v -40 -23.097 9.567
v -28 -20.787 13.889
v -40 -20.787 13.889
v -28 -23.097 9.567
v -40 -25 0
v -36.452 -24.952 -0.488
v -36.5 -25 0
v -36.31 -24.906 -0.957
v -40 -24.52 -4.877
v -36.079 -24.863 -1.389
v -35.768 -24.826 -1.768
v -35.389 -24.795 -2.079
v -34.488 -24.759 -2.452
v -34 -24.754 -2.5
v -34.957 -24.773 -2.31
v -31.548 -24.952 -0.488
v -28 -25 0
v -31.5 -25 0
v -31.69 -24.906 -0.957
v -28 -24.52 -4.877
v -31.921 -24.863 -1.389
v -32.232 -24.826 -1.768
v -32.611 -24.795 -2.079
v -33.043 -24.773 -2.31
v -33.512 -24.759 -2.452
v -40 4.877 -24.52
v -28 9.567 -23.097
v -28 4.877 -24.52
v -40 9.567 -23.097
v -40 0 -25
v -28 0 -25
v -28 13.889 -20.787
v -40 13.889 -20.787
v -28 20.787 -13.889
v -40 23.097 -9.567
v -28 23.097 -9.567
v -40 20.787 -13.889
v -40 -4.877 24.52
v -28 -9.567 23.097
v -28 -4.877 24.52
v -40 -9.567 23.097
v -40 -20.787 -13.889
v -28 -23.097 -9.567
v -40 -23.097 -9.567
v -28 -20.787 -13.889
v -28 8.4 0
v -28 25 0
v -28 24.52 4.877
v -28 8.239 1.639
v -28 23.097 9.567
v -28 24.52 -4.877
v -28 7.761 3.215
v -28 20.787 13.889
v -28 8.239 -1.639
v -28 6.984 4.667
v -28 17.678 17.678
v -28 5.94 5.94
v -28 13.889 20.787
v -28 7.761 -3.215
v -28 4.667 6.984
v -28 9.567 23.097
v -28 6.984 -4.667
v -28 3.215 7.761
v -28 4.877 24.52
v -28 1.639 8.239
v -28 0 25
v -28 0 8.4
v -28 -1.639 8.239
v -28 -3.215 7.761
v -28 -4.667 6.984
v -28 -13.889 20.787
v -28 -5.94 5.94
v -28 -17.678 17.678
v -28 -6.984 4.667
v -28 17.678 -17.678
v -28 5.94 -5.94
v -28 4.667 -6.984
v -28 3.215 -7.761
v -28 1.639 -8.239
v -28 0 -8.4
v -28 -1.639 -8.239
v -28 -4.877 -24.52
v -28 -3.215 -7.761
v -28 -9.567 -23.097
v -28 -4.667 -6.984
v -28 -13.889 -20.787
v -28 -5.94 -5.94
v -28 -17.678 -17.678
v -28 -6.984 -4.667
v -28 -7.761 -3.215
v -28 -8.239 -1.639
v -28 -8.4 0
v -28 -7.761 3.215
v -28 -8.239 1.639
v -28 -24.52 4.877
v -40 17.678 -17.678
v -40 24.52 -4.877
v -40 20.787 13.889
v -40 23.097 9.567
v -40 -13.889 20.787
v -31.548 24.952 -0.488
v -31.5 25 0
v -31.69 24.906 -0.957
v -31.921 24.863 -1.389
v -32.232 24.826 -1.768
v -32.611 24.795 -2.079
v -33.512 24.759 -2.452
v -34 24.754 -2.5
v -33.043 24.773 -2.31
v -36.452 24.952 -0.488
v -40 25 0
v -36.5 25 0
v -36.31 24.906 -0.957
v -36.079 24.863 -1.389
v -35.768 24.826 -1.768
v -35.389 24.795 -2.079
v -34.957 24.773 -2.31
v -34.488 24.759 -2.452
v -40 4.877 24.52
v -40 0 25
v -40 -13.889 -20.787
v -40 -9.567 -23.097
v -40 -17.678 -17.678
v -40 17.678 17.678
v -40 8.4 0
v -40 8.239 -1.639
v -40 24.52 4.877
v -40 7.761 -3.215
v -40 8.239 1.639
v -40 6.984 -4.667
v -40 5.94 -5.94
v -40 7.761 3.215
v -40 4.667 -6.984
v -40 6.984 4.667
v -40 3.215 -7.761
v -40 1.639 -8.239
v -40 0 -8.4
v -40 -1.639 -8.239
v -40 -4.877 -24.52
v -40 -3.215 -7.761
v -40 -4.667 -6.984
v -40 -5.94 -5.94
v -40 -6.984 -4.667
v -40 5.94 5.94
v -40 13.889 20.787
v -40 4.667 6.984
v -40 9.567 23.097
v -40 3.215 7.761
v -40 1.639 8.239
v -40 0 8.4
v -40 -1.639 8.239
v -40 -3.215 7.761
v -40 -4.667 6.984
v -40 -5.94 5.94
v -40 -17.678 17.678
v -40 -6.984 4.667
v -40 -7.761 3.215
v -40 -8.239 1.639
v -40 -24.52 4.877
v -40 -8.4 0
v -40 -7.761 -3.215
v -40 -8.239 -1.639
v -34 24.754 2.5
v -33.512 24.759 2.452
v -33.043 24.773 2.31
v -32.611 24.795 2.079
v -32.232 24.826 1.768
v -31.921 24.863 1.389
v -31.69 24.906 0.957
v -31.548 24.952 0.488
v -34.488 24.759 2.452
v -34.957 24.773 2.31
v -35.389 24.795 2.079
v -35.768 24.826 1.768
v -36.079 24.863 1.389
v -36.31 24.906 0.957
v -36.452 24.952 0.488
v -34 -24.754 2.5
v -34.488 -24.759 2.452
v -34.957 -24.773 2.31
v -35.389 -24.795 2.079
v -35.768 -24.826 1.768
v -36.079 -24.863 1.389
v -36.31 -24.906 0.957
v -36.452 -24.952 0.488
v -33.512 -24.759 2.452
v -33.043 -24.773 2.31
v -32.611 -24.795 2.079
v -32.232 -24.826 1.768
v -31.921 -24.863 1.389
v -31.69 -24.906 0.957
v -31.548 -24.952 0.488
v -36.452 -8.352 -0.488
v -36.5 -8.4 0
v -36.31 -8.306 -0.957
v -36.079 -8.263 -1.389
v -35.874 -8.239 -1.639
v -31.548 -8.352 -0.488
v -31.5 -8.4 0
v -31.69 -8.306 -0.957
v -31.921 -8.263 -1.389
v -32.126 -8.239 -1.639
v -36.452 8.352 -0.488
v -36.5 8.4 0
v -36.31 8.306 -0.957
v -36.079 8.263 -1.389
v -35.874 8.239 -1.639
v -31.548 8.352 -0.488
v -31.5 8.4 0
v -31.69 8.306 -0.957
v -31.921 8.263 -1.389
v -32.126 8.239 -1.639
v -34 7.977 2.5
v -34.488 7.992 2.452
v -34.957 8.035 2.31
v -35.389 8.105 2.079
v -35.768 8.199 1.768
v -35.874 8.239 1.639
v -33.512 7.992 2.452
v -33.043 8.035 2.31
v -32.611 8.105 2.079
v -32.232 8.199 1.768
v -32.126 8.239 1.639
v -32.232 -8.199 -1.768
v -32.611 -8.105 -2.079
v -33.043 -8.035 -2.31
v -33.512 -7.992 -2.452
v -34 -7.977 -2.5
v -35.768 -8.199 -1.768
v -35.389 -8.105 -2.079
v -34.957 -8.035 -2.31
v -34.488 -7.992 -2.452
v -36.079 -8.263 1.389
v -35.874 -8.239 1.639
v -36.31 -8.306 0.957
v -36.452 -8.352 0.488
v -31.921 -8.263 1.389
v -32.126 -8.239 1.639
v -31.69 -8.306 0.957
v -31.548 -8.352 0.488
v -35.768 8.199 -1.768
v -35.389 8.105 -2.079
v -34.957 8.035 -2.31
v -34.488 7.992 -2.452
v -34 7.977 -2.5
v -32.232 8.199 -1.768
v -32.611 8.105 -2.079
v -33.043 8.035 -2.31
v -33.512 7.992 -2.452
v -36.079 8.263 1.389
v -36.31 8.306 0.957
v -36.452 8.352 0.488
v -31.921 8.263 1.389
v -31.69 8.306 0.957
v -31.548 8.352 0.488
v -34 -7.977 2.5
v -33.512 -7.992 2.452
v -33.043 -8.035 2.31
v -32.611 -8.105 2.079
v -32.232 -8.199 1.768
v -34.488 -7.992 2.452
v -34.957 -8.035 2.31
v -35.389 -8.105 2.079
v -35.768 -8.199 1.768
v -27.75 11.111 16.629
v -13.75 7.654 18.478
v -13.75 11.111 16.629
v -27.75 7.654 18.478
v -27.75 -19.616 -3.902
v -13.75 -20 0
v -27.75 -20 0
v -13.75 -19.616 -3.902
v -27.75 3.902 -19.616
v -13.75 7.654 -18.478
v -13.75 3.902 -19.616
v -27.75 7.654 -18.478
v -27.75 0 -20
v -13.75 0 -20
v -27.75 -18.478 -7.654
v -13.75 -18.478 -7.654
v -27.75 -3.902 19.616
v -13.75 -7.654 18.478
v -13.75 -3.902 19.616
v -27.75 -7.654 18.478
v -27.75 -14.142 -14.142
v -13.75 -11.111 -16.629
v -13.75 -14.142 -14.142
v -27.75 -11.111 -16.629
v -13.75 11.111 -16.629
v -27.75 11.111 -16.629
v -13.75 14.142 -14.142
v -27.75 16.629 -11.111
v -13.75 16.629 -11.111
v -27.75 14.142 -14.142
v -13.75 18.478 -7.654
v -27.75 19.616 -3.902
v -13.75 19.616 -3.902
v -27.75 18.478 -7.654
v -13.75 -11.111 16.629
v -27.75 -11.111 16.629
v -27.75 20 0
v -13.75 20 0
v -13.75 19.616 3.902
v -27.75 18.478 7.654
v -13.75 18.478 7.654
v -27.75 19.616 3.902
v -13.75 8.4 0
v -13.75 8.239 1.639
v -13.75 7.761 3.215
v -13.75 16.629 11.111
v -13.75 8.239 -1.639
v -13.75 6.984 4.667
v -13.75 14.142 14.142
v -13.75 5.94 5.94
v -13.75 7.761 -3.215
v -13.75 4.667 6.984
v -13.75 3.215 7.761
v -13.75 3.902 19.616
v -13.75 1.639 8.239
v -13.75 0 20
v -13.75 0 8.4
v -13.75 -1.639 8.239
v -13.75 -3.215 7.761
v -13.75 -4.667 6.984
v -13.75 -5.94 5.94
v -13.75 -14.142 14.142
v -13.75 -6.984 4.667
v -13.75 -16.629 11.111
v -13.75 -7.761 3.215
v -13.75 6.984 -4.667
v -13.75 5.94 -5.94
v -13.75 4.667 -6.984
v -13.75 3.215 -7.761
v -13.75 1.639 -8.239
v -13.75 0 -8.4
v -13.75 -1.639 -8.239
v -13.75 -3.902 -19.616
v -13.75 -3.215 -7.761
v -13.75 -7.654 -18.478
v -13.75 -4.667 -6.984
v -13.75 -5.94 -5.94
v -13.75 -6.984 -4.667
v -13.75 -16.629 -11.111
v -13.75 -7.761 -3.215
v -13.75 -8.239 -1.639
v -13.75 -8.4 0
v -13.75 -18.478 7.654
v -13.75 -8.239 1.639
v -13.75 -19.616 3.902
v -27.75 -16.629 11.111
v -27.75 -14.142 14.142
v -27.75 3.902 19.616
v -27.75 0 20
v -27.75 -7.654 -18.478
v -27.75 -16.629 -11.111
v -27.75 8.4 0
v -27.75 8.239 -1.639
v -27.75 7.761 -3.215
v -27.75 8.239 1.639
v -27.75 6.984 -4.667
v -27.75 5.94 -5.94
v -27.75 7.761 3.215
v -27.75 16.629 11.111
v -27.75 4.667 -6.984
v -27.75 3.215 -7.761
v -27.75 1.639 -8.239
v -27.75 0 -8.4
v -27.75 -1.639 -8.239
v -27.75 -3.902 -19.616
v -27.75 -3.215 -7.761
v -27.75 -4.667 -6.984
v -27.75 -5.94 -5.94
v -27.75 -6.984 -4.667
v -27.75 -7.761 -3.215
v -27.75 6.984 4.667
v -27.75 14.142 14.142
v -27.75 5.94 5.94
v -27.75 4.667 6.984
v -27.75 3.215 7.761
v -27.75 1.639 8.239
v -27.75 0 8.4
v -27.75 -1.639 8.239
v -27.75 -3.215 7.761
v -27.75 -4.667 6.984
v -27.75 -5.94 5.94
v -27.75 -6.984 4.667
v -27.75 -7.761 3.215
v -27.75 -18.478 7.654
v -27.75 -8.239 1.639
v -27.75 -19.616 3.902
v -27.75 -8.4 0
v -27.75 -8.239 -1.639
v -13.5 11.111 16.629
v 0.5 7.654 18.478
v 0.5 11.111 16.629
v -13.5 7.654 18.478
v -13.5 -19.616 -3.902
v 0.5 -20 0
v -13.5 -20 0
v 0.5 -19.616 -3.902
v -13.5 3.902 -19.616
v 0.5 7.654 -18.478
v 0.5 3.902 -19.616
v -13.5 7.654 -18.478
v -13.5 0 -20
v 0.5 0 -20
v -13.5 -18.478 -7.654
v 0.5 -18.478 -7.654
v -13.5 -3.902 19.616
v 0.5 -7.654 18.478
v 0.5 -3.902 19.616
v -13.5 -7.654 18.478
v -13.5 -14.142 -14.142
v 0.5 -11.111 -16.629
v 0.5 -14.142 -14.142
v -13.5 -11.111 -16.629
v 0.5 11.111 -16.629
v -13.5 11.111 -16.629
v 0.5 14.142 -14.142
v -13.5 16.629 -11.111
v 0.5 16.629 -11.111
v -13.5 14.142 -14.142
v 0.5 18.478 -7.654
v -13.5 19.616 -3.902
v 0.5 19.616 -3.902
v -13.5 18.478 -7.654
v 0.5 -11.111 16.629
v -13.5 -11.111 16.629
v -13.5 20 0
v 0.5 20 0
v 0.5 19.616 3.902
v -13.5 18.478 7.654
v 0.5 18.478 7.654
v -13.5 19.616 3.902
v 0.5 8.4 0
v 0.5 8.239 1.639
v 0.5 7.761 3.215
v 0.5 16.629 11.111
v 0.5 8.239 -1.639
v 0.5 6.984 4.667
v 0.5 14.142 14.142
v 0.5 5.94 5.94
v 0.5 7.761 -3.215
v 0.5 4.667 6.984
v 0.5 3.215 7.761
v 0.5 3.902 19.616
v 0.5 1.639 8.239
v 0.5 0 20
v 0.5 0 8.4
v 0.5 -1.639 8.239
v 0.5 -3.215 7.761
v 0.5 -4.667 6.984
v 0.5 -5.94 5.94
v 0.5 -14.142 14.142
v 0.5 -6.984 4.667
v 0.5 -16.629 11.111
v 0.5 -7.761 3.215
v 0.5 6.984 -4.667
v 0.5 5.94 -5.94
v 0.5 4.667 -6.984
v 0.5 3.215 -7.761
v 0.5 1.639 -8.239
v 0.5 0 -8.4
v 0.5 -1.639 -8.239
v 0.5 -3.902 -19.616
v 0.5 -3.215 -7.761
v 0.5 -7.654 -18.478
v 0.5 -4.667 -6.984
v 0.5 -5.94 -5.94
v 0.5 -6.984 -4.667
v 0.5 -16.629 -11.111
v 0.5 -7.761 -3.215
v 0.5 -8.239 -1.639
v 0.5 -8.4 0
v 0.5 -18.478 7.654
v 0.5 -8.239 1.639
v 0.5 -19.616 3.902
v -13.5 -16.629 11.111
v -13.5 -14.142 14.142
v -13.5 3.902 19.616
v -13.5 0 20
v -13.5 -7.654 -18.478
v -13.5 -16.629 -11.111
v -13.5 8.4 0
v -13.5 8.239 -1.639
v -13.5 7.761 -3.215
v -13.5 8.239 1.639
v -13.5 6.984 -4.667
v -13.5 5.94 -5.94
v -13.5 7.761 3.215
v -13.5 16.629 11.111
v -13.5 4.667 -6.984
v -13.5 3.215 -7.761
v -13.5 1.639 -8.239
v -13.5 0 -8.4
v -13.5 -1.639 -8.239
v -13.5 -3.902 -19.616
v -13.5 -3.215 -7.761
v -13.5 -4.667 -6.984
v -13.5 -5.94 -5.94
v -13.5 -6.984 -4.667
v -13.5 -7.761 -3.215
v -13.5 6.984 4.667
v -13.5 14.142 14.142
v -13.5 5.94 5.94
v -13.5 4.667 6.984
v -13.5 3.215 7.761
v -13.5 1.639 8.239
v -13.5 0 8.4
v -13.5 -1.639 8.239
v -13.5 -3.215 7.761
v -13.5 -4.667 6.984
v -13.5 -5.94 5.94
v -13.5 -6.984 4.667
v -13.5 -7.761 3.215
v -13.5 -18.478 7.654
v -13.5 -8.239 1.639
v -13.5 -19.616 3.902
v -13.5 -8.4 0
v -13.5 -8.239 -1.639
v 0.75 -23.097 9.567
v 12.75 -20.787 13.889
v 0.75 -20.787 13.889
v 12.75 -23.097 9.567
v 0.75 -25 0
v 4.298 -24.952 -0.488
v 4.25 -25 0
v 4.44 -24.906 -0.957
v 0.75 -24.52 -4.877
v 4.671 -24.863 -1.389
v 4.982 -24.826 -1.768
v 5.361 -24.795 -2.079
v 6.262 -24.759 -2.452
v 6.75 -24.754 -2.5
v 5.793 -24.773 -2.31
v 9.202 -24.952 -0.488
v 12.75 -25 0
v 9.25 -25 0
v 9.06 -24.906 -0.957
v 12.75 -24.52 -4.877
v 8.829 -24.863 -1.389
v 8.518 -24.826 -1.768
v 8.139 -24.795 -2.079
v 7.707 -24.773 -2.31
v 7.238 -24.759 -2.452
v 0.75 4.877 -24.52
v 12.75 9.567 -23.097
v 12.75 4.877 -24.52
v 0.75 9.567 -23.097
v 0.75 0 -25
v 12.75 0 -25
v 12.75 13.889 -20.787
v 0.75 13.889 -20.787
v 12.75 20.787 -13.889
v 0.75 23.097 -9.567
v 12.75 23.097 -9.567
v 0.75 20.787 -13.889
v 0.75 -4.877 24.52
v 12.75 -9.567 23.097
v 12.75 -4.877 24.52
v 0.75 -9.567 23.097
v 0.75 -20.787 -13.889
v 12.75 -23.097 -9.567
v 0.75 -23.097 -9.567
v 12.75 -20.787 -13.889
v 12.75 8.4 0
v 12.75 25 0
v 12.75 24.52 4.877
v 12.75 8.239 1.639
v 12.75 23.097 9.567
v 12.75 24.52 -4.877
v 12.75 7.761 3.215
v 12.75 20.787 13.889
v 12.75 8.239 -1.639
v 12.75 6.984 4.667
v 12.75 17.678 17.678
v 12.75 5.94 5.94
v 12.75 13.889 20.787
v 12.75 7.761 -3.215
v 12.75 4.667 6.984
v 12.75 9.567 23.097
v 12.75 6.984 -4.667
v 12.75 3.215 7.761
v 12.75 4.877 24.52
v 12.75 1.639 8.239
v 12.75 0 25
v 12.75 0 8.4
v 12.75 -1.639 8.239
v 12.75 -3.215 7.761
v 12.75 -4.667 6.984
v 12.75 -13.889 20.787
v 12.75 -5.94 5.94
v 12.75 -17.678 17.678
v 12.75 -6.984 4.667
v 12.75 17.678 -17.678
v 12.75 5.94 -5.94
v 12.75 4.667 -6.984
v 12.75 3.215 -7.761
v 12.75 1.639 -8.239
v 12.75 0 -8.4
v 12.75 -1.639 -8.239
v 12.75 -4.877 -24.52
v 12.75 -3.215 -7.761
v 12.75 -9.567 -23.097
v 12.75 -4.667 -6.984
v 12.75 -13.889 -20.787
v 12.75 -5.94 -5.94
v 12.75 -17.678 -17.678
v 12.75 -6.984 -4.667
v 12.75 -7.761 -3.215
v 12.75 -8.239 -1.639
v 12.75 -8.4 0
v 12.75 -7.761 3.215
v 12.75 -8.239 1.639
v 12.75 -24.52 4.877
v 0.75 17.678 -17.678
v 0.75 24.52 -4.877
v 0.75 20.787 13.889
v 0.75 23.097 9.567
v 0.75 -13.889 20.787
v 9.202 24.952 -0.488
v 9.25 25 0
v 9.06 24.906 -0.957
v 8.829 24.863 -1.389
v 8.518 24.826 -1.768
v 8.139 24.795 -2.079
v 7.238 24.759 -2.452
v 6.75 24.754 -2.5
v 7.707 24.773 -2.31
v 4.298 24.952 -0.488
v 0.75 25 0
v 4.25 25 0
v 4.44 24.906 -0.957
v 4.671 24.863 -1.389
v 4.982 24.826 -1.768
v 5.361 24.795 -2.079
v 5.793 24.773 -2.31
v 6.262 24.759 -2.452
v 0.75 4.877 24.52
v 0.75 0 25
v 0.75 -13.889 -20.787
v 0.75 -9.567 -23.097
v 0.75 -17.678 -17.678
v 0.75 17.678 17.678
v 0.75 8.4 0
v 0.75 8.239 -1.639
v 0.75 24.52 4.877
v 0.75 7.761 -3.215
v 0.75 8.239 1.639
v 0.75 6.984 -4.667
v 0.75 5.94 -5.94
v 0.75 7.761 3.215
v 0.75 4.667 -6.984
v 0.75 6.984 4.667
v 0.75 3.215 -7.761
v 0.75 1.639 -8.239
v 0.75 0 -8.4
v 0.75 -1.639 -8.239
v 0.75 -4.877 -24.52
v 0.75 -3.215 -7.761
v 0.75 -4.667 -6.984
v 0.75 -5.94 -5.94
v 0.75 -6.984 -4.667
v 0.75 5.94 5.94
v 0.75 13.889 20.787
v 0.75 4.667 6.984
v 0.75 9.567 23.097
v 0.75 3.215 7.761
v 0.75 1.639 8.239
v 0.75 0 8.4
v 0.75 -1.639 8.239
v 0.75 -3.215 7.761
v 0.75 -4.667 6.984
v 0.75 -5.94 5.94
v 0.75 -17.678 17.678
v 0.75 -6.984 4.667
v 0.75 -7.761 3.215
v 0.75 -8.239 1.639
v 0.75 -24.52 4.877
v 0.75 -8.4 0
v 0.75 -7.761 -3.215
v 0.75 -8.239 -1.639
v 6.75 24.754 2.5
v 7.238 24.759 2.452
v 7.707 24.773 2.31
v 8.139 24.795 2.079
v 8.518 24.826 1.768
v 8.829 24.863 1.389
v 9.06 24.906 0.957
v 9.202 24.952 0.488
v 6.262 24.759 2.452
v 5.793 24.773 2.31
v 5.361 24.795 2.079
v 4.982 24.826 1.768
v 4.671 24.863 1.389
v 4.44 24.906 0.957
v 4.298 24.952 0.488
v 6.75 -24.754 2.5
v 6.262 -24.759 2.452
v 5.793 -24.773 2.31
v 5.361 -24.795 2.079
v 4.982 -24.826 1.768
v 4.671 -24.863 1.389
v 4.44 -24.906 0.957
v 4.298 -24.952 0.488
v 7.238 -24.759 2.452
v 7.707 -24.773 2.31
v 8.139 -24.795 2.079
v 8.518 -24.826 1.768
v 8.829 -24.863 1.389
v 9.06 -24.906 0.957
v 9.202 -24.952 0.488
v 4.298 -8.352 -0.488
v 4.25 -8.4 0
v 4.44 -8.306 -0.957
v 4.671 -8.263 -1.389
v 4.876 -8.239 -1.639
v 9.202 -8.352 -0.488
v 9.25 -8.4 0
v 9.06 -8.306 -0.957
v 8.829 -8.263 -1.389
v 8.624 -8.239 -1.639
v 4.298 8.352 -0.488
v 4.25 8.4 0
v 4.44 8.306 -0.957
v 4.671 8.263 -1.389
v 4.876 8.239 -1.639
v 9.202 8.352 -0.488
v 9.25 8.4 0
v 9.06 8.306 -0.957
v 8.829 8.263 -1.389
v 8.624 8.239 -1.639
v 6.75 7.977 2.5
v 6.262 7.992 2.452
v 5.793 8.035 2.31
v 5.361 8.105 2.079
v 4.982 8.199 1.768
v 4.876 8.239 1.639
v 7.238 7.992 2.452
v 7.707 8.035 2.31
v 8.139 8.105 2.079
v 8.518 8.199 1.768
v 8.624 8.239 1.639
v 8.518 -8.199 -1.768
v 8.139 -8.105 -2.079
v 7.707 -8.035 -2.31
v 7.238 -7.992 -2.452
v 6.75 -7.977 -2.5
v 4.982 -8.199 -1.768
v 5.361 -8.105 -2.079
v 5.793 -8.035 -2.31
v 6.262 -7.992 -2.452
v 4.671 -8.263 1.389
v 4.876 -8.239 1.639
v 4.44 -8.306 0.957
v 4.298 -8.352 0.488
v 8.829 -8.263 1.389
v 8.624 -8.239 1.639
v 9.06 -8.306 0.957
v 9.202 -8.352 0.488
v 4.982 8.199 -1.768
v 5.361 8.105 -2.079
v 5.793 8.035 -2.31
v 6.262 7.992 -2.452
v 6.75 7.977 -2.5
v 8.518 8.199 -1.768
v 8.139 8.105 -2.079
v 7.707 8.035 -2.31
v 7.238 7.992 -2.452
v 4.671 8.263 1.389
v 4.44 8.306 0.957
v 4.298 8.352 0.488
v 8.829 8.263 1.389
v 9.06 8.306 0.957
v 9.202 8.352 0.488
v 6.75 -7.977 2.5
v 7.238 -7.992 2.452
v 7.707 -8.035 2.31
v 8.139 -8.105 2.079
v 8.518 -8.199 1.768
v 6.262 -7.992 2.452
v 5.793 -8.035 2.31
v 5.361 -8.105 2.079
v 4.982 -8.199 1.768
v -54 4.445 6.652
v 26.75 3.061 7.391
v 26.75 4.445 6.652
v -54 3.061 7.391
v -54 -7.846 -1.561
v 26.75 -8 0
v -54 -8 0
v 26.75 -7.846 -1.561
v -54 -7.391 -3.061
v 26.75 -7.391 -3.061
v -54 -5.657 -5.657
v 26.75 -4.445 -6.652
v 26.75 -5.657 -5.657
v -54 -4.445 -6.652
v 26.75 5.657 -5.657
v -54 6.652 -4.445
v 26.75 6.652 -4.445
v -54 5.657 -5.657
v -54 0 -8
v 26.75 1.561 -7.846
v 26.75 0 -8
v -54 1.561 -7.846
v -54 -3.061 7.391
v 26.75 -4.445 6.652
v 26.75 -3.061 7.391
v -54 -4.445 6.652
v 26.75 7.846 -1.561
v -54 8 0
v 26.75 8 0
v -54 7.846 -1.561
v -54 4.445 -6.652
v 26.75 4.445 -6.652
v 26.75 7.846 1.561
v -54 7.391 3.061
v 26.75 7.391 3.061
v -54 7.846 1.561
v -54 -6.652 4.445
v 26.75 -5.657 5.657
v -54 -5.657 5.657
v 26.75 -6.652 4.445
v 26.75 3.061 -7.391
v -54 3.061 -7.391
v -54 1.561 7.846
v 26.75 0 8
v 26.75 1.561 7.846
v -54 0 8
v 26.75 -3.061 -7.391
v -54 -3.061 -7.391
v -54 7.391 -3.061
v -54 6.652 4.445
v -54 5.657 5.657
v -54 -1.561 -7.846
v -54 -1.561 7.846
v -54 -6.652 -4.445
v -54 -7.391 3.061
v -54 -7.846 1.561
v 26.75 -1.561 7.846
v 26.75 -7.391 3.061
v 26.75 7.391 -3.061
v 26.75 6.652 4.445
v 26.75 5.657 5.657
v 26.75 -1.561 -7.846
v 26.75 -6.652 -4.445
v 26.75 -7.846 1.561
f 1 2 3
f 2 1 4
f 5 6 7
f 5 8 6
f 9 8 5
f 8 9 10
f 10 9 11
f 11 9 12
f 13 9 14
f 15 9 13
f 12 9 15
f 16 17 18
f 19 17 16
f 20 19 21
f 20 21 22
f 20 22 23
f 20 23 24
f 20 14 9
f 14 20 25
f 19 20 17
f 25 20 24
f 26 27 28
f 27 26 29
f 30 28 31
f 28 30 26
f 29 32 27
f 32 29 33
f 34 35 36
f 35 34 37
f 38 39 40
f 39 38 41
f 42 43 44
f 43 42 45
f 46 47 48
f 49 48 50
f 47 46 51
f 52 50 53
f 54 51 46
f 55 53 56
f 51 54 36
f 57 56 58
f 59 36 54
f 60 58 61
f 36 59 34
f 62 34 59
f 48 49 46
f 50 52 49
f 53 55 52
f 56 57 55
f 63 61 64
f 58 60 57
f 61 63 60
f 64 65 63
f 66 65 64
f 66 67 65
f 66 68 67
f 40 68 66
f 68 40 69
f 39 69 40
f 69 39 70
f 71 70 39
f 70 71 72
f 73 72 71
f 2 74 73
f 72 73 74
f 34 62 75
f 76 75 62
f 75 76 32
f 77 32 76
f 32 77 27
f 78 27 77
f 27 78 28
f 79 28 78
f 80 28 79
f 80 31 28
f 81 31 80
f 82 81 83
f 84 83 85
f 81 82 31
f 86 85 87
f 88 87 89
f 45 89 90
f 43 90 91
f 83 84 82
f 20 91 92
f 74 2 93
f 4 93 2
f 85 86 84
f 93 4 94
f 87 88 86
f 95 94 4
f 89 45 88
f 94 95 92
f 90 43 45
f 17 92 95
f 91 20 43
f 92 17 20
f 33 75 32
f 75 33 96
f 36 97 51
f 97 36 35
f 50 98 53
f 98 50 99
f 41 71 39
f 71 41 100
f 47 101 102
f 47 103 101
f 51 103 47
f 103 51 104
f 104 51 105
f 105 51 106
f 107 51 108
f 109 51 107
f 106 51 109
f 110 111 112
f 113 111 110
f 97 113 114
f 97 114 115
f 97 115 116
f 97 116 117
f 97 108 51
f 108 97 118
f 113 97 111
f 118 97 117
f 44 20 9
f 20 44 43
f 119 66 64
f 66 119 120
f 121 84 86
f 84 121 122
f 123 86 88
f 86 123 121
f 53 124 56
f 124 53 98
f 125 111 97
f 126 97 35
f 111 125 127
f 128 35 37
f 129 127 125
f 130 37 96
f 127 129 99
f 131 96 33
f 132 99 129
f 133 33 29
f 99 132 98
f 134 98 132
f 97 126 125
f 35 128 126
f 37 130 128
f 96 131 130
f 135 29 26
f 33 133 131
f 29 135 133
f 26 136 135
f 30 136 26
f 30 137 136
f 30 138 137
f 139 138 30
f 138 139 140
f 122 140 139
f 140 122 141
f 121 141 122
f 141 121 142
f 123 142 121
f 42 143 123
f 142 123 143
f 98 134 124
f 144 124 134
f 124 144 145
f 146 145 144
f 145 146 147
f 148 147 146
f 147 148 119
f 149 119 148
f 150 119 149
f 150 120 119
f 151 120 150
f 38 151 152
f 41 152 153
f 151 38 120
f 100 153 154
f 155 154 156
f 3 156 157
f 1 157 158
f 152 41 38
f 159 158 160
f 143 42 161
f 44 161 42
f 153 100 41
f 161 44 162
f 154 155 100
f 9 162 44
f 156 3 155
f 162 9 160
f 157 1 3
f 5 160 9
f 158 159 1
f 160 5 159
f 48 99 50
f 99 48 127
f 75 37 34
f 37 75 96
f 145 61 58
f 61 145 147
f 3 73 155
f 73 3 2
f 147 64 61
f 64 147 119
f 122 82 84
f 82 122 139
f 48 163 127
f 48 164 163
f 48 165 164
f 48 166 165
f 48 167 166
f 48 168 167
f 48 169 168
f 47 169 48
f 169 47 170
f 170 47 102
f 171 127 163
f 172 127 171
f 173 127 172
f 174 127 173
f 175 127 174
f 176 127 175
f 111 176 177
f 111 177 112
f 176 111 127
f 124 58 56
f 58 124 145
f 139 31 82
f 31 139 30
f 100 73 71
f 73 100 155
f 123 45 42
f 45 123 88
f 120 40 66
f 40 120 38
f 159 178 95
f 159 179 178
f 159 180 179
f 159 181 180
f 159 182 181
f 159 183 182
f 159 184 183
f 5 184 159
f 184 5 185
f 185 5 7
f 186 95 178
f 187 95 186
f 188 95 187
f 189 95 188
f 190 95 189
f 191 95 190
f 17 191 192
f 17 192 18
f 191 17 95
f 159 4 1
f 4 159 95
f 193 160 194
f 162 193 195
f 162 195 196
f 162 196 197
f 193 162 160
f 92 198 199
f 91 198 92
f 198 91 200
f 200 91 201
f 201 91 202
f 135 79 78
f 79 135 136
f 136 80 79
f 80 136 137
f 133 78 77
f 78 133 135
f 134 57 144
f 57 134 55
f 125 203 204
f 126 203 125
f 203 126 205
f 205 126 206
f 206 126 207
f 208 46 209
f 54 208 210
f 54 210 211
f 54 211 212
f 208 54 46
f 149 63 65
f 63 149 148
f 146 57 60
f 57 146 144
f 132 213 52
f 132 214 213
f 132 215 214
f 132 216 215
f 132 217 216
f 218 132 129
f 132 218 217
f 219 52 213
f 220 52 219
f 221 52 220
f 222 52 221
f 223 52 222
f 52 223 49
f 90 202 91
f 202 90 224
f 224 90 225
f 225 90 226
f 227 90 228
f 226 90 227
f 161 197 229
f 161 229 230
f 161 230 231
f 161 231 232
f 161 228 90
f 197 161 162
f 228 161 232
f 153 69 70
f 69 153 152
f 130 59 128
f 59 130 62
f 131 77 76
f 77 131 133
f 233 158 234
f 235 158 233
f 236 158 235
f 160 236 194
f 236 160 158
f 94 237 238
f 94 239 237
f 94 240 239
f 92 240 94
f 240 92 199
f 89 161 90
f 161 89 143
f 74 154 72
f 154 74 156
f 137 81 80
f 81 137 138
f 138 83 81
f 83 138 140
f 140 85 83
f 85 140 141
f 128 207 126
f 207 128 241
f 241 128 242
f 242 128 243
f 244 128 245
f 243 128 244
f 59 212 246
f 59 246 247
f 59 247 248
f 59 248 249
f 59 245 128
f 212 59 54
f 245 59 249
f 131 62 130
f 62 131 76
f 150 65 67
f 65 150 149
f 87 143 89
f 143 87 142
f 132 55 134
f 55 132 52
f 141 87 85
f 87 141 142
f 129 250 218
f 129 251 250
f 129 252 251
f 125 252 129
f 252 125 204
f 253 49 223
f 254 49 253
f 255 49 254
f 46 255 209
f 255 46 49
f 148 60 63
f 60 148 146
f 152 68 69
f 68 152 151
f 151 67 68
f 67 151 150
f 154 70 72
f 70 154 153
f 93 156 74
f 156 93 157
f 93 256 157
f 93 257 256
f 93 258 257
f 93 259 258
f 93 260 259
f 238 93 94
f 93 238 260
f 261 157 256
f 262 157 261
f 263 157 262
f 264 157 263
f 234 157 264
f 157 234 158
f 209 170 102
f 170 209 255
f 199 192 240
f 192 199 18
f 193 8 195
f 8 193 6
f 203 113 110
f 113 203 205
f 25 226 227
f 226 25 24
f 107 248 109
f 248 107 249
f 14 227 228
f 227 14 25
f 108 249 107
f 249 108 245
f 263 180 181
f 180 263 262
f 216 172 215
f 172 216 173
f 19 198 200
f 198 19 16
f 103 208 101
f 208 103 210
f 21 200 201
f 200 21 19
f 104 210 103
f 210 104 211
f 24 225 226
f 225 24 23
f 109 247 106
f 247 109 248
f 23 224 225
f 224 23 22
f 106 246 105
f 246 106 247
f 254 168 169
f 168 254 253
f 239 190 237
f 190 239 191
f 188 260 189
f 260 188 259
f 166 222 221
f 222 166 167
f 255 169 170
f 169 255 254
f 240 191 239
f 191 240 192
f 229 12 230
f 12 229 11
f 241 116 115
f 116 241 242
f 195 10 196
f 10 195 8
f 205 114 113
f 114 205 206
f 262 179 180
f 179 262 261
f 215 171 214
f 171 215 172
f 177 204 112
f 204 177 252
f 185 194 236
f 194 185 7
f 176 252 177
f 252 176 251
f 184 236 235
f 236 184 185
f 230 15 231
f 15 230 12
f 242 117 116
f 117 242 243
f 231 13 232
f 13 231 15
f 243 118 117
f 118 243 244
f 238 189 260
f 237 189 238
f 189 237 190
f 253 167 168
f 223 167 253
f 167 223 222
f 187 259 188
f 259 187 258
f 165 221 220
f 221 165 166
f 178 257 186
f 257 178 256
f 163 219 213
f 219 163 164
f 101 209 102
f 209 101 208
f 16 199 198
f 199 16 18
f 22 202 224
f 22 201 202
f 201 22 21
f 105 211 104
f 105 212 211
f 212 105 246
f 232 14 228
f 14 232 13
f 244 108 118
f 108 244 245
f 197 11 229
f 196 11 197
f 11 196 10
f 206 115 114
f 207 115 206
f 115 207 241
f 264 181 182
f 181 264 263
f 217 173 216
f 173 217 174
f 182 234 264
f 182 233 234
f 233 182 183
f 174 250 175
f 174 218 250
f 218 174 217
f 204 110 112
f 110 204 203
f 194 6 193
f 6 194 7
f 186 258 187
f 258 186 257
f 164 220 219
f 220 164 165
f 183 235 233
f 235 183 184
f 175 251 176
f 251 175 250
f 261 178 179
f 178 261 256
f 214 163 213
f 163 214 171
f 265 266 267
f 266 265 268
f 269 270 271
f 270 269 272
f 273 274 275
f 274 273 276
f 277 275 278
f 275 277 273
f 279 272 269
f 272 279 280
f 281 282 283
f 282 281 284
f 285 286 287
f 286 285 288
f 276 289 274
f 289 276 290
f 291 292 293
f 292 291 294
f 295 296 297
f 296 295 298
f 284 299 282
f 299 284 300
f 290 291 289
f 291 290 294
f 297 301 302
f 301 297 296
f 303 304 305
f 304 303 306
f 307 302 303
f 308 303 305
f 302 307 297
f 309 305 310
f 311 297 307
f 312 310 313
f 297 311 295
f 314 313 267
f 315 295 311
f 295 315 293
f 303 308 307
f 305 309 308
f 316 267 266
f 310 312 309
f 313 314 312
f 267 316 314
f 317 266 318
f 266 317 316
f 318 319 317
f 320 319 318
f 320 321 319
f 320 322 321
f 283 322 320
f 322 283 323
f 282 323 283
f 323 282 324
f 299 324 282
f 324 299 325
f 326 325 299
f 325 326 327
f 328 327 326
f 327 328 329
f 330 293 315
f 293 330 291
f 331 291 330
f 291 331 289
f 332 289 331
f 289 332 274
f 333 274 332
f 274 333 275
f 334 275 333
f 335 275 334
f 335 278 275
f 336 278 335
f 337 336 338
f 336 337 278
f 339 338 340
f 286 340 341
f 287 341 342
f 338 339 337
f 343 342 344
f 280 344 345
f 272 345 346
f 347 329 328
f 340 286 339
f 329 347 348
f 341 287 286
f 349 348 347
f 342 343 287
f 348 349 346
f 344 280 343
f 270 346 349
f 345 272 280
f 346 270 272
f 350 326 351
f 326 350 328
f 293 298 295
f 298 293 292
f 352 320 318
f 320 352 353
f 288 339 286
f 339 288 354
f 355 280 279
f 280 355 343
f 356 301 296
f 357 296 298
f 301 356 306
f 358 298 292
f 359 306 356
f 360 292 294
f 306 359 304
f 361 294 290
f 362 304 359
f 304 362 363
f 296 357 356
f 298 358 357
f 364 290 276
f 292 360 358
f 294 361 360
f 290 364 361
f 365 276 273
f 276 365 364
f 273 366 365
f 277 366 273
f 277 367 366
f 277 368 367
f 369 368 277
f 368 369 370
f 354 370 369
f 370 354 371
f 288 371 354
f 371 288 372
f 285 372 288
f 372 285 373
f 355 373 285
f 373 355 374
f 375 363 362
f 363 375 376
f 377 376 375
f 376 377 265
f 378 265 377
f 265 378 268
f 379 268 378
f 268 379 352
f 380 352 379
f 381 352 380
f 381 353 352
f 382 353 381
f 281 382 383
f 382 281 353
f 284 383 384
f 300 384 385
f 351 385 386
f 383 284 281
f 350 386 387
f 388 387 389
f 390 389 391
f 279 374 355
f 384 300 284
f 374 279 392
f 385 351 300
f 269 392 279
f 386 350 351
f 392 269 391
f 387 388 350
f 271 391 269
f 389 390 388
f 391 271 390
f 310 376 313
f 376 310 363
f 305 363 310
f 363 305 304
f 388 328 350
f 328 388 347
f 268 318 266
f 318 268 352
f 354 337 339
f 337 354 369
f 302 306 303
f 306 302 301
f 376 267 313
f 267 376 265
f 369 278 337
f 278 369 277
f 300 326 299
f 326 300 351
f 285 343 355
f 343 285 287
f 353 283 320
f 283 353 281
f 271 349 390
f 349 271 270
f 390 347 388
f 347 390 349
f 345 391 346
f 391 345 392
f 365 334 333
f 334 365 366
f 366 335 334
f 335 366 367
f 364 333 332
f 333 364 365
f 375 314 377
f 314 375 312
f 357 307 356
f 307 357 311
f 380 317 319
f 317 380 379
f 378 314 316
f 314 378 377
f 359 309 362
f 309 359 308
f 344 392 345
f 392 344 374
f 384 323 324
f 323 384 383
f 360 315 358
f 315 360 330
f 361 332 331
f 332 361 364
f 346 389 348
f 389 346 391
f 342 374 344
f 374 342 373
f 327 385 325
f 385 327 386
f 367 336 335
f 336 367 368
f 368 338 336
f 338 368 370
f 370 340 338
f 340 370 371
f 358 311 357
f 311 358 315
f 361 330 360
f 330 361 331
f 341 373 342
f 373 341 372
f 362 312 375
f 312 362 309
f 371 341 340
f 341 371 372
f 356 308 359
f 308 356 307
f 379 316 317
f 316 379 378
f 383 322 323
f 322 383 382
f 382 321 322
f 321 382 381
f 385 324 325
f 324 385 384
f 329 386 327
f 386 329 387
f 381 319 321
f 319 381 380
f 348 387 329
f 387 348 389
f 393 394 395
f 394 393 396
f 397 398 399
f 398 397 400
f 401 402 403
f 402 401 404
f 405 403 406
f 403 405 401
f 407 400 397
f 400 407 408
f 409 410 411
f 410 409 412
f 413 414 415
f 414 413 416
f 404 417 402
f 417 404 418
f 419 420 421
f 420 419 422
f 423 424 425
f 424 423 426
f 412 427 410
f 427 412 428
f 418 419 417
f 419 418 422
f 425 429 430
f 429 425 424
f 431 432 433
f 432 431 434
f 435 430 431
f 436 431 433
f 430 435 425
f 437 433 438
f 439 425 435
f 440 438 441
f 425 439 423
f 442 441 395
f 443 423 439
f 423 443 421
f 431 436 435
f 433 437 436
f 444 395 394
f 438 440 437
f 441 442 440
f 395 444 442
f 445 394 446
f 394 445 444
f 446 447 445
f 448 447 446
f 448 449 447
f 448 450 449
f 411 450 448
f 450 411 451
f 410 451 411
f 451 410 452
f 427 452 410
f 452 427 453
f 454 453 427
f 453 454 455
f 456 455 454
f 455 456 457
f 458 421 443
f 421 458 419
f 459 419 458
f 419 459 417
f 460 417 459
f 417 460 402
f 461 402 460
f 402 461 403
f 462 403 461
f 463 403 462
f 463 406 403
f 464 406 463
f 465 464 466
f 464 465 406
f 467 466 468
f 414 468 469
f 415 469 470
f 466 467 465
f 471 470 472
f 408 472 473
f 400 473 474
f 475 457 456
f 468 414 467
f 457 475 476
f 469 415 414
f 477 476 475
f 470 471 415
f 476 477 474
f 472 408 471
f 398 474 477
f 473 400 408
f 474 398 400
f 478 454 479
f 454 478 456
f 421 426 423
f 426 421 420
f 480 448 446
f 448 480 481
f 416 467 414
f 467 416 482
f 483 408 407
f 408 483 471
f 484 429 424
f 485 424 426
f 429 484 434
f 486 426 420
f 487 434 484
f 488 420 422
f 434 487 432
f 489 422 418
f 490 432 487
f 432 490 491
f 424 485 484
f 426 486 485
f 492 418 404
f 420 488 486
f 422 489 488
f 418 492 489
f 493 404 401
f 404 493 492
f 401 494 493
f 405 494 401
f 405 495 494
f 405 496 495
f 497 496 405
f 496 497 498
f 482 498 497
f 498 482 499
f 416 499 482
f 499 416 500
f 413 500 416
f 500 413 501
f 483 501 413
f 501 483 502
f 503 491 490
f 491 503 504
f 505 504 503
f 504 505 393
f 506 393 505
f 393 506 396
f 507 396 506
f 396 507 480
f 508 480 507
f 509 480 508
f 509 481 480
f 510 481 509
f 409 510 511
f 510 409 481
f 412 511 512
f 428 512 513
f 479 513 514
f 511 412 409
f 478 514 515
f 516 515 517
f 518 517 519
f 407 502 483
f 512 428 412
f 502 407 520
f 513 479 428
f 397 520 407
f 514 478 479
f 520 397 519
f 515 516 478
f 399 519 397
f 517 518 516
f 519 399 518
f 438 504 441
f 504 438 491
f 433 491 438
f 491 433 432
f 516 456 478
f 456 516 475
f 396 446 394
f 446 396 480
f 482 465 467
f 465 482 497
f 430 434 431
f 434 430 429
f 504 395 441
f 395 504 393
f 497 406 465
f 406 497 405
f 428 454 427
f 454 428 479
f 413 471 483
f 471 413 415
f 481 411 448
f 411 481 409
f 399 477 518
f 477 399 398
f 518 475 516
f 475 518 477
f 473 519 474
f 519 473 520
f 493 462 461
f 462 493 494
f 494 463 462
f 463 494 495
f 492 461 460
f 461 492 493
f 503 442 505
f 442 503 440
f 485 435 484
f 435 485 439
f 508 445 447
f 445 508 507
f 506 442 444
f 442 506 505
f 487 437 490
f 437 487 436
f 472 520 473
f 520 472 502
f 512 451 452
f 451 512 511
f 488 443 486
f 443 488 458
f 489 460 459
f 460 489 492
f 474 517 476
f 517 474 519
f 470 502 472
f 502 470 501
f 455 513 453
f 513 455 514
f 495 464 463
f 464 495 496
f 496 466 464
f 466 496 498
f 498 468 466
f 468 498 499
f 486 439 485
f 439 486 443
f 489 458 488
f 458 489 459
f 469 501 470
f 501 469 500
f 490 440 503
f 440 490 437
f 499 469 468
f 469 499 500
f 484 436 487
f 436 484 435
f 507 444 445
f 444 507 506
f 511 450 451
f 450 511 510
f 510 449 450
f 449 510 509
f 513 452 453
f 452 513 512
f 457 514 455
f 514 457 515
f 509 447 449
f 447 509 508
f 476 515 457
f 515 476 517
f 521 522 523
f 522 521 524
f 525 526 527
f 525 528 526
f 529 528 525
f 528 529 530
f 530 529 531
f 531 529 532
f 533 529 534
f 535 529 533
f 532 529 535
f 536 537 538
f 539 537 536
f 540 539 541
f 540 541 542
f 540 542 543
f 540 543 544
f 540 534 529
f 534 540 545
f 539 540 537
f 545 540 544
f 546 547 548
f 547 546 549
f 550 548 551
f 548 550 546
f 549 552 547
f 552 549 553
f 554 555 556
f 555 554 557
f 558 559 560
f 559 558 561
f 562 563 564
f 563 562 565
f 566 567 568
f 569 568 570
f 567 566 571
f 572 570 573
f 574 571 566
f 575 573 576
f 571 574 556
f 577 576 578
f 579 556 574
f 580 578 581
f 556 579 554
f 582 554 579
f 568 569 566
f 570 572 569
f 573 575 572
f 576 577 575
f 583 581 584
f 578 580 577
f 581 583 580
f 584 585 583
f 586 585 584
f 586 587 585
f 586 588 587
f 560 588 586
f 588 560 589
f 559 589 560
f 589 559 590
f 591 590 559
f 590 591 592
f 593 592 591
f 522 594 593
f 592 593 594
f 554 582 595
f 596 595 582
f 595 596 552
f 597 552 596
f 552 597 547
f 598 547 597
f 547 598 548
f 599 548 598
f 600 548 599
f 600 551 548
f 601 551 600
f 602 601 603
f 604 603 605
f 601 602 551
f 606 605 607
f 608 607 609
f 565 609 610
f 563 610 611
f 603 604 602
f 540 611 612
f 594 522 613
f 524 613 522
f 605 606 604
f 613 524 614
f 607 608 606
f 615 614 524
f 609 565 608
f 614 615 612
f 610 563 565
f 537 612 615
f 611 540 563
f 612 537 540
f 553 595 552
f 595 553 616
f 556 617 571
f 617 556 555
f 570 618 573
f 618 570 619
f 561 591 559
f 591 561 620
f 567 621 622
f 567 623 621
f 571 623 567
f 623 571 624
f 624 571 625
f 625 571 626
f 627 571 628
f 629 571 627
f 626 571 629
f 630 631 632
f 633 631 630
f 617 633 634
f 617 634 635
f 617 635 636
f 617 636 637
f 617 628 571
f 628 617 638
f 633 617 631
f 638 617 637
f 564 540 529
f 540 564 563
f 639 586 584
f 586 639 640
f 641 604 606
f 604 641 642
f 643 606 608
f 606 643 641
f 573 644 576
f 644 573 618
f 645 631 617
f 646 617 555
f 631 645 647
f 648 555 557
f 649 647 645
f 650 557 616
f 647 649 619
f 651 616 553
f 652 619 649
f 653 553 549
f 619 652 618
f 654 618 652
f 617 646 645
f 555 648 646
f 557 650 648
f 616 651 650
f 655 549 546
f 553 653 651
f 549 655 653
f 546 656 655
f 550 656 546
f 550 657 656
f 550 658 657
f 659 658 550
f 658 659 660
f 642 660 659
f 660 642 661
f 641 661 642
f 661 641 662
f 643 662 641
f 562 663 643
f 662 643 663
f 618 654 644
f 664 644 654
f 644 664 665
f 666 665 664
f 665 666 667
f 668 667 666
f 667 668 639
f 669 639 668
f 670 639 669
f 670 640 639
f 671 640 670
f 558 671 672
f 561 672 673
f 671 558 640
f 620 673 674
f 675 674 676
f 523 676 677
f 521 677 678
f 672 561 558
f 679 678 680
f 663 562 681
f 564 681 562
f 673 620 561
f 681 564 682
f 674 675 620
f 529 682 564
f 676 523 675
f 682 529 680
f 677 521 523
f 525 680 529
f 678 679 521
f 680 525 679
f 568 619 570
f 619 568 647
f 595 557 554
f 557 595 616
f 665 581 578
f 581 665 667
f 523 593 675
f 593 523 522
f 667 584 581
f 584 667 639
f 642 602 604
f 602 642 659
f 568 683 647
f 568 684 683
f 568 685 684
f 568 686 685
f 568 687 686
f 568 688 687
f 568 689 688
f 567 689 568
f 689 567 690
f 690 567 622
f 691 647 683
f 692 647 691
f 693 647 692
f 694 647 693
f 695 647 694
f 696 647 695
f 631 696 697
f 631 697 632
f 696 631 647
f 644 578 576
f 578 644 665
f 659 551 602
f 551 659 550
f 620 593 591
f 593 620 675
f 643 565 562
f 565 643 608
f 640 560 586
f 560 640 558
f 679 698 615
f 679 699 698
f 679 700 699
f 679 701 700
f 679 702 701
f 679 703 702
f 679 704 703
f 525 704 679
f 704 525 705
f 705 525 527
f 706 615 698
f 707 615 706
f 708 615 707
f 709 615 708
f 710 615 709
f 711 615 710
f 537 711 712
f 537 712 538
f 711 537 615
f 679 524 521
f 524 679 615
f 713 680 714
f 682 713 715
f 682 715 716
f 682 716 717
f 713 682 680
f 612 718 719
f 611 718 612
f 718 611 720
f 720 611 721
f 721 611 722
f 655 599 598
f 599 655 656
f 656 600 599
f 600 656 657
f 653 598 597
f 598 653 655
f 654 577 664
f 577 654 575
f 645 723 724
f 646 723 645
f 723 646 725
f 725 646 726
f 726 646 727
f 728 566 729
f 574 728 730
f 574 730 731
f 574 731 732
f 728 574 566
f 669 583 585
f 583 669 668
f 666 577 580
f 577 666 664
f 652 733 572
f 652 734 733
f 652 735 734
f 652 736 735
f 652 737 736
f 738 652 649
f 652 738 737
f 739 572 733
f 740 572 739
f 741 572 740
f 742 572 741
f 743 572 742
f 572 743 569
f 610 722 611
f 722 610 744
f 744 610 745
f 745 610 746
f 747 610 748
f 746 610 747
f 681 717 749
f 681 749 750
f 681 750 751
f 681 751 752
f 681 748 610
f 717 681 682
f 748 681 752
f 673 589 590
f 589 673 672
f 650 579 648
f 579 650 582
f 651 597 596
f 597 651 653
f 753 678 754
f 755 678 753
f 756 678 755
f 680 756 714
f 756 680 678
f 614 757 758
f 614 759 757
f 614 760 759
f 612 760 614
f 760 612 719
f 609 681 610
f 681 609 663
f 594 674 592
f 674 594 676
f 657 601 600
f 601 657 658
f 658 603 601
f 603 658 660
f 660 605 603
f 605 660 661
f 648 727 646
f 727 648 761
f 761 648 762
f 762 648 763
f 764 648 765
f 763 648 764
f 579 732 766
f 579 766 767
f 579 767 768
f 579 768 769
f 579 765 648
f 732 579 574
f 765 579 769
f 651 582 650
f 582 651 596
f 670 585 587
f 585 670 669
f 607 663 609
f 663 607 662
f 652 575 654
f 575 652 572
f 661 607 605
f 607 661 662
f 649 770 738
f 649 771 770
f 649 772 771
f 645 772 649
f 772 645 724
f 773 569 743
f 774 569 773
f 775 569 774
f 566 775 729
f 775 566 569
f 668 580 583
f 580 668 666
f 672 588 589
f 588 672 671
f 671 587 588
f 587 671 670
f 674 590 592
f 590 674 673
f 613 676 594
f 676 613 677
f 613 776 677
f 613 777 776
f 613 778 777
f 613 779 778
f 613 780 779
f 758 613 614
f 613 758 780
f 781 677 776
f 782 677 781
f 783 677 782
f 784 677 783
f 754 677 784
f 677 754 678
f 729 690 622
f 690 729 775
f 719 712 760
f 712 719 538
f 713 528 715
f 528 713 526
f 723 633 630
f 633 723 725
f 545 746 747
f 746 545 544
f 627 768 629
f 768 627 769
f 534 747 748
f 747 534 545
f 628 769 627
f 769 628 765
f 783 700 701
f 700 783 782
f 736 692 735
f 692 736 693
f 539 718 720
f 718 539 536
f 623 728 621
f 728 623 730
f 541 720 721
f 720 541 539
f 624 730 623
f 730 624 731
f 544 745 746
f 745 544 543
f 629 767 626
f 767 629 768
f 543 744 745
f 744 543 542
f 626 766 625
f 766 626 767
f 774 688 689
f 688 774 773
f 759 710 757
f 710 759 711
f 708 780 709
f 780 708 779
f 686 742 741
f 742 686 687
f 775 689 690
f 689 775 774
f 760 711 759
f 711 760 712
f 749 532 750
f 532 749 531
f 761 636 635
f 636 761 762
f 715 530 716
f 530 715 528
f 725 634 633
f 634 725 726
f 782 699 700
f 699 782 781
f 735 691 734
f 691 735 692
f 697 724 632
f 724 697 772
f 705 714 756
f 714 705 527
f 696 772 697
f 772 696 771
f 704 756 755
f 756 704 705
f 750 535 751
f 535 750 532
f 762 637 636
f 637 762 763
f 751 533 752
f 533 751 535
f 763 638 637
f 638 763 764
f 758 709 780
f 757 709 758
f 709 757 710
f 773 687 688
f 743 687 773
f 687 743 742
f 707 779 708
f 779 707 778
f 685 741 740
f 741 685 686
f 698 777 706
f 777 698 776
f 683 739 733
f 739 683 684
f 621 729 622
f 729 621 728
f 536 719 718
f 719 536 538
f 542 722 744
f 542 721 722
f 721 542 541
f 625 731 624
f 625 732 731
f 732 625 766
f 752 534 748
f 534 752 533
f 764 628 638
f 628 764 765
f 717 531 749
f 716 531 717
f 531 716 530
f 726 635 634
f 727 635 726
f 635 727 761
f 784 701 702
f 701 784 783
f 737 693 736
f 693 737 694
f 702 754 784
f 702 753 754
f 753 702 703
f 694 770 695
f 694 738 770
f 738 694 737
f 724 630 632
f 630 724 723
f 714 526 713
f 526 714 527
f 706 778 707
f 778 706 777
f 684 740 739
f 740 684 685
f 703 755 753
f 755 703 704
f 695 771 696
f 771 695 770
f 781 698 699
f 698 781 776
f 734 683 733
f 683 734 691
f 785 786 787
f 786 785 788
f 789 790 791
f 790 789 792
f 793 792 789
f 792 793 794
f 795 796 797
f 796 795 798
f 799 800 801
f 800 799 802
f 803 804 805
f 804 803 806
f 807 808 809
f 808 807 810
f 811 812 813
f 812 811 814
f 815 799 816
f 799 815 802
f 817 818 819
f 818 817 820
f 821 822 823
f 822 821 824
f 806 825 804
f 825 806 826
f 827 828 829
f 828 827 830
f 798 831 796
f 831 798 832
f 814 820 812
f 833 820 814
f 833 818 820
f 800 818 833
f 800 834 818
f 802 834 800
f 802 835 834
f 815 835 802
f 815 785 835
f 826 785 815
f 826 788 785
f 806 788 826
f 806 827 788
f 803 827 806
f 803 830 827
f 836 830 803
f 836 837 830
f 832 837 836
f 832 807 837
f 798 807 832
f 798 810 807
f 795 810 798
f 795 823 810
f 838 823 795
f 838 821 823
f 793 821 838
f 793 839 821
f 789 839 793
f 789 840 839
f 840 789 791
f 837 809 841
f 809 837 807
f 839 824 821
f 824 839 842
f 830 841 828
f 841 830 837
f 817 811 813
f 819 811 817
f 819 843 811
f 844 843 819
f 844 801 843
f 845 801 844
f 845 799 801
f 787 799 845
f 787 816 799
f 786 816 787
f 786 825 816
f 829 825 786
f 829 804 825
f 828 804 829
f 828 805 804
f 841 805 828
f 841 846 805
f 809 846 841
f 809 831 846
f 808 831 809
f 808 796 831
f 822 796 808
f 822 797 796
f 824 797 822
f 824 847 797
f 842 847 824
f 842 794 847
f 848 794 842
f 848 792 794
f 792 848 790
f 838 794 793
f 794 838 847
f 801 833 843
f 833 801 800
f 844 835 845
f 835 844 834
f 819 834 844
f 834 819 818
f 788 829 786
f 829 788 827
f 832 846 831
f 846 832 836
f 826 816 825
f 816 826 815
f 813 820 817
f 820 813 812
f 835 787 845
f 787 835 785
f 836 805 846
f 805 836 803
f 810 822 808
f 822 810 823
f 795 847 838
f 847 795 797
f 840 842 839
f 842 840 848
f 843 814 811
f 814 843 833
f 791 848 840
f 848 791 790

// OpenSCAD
$fn = 32;

// ------------------------------------------------------------------------
// Shaft with rings and collars: d16 shaft, 4 rings
// Every part is its own module, assembly() places them once.
// ------------------------------------------------------------------------

// --- part 1 ---
module shaft() {
  translate([0, 0, -40.375]) cylinder(h = 80.75, d = 16);
}

// --- part 2 ---
module collar_a() {
  difference() {
    cylinder(h = 12, d = 50);
    translate([0, 0, -1]) cylinder(h = 14, d = 16.8);
    translate([0, 0, 6]) rotate([90, 0, 0]) cylinder(h = 52, d = 5, center = true);
  }
}

// --- part 3 ---
module spacer_a() {
  difference() {
      translate([0, 0, 0]) cylinder(h = 14, d = 40);
      translate([0, 0, -1]) cylinder(h = 16, d = 16.8);
    }
}

// --- part 4 ---
module spacer_b() {
  difference() {
      translate([0, 0, 0]) cylinder(h = 14, d = 40);
      translate([0, 0, -1]) cylinder(h = 16, d = 16.8);
    }
}

// --- part 5 ---
module collar_b() {
  difference() {
    cylinder(h = 12, d = 50);
    translate([0, 0, -1]) cylinder(h = 14, d = 16.8);
    translate([0, 0, 6]) rotate([90, 0, 0]) cylinder(h = 52, d = 5, center = true);
  }
}

// --- assembly ---
module assembly() {
  translate([-13.625, 0, 0]) rotate([0, 90, 0]) shaft();
  translate([-40, 0, 0]) rotate([0, 90, 0]) collar_a();
  translate([-27.75, 0, 0]) rotate([0, 90, 0]) spacer_a();
  translate([-13.5, 0, 0]) rotate([0, 90, 0]) spacer_b();
  translate([0.75, 0, 0]) rotate([0, 90, 0]) collar_b();
}

assembly();
